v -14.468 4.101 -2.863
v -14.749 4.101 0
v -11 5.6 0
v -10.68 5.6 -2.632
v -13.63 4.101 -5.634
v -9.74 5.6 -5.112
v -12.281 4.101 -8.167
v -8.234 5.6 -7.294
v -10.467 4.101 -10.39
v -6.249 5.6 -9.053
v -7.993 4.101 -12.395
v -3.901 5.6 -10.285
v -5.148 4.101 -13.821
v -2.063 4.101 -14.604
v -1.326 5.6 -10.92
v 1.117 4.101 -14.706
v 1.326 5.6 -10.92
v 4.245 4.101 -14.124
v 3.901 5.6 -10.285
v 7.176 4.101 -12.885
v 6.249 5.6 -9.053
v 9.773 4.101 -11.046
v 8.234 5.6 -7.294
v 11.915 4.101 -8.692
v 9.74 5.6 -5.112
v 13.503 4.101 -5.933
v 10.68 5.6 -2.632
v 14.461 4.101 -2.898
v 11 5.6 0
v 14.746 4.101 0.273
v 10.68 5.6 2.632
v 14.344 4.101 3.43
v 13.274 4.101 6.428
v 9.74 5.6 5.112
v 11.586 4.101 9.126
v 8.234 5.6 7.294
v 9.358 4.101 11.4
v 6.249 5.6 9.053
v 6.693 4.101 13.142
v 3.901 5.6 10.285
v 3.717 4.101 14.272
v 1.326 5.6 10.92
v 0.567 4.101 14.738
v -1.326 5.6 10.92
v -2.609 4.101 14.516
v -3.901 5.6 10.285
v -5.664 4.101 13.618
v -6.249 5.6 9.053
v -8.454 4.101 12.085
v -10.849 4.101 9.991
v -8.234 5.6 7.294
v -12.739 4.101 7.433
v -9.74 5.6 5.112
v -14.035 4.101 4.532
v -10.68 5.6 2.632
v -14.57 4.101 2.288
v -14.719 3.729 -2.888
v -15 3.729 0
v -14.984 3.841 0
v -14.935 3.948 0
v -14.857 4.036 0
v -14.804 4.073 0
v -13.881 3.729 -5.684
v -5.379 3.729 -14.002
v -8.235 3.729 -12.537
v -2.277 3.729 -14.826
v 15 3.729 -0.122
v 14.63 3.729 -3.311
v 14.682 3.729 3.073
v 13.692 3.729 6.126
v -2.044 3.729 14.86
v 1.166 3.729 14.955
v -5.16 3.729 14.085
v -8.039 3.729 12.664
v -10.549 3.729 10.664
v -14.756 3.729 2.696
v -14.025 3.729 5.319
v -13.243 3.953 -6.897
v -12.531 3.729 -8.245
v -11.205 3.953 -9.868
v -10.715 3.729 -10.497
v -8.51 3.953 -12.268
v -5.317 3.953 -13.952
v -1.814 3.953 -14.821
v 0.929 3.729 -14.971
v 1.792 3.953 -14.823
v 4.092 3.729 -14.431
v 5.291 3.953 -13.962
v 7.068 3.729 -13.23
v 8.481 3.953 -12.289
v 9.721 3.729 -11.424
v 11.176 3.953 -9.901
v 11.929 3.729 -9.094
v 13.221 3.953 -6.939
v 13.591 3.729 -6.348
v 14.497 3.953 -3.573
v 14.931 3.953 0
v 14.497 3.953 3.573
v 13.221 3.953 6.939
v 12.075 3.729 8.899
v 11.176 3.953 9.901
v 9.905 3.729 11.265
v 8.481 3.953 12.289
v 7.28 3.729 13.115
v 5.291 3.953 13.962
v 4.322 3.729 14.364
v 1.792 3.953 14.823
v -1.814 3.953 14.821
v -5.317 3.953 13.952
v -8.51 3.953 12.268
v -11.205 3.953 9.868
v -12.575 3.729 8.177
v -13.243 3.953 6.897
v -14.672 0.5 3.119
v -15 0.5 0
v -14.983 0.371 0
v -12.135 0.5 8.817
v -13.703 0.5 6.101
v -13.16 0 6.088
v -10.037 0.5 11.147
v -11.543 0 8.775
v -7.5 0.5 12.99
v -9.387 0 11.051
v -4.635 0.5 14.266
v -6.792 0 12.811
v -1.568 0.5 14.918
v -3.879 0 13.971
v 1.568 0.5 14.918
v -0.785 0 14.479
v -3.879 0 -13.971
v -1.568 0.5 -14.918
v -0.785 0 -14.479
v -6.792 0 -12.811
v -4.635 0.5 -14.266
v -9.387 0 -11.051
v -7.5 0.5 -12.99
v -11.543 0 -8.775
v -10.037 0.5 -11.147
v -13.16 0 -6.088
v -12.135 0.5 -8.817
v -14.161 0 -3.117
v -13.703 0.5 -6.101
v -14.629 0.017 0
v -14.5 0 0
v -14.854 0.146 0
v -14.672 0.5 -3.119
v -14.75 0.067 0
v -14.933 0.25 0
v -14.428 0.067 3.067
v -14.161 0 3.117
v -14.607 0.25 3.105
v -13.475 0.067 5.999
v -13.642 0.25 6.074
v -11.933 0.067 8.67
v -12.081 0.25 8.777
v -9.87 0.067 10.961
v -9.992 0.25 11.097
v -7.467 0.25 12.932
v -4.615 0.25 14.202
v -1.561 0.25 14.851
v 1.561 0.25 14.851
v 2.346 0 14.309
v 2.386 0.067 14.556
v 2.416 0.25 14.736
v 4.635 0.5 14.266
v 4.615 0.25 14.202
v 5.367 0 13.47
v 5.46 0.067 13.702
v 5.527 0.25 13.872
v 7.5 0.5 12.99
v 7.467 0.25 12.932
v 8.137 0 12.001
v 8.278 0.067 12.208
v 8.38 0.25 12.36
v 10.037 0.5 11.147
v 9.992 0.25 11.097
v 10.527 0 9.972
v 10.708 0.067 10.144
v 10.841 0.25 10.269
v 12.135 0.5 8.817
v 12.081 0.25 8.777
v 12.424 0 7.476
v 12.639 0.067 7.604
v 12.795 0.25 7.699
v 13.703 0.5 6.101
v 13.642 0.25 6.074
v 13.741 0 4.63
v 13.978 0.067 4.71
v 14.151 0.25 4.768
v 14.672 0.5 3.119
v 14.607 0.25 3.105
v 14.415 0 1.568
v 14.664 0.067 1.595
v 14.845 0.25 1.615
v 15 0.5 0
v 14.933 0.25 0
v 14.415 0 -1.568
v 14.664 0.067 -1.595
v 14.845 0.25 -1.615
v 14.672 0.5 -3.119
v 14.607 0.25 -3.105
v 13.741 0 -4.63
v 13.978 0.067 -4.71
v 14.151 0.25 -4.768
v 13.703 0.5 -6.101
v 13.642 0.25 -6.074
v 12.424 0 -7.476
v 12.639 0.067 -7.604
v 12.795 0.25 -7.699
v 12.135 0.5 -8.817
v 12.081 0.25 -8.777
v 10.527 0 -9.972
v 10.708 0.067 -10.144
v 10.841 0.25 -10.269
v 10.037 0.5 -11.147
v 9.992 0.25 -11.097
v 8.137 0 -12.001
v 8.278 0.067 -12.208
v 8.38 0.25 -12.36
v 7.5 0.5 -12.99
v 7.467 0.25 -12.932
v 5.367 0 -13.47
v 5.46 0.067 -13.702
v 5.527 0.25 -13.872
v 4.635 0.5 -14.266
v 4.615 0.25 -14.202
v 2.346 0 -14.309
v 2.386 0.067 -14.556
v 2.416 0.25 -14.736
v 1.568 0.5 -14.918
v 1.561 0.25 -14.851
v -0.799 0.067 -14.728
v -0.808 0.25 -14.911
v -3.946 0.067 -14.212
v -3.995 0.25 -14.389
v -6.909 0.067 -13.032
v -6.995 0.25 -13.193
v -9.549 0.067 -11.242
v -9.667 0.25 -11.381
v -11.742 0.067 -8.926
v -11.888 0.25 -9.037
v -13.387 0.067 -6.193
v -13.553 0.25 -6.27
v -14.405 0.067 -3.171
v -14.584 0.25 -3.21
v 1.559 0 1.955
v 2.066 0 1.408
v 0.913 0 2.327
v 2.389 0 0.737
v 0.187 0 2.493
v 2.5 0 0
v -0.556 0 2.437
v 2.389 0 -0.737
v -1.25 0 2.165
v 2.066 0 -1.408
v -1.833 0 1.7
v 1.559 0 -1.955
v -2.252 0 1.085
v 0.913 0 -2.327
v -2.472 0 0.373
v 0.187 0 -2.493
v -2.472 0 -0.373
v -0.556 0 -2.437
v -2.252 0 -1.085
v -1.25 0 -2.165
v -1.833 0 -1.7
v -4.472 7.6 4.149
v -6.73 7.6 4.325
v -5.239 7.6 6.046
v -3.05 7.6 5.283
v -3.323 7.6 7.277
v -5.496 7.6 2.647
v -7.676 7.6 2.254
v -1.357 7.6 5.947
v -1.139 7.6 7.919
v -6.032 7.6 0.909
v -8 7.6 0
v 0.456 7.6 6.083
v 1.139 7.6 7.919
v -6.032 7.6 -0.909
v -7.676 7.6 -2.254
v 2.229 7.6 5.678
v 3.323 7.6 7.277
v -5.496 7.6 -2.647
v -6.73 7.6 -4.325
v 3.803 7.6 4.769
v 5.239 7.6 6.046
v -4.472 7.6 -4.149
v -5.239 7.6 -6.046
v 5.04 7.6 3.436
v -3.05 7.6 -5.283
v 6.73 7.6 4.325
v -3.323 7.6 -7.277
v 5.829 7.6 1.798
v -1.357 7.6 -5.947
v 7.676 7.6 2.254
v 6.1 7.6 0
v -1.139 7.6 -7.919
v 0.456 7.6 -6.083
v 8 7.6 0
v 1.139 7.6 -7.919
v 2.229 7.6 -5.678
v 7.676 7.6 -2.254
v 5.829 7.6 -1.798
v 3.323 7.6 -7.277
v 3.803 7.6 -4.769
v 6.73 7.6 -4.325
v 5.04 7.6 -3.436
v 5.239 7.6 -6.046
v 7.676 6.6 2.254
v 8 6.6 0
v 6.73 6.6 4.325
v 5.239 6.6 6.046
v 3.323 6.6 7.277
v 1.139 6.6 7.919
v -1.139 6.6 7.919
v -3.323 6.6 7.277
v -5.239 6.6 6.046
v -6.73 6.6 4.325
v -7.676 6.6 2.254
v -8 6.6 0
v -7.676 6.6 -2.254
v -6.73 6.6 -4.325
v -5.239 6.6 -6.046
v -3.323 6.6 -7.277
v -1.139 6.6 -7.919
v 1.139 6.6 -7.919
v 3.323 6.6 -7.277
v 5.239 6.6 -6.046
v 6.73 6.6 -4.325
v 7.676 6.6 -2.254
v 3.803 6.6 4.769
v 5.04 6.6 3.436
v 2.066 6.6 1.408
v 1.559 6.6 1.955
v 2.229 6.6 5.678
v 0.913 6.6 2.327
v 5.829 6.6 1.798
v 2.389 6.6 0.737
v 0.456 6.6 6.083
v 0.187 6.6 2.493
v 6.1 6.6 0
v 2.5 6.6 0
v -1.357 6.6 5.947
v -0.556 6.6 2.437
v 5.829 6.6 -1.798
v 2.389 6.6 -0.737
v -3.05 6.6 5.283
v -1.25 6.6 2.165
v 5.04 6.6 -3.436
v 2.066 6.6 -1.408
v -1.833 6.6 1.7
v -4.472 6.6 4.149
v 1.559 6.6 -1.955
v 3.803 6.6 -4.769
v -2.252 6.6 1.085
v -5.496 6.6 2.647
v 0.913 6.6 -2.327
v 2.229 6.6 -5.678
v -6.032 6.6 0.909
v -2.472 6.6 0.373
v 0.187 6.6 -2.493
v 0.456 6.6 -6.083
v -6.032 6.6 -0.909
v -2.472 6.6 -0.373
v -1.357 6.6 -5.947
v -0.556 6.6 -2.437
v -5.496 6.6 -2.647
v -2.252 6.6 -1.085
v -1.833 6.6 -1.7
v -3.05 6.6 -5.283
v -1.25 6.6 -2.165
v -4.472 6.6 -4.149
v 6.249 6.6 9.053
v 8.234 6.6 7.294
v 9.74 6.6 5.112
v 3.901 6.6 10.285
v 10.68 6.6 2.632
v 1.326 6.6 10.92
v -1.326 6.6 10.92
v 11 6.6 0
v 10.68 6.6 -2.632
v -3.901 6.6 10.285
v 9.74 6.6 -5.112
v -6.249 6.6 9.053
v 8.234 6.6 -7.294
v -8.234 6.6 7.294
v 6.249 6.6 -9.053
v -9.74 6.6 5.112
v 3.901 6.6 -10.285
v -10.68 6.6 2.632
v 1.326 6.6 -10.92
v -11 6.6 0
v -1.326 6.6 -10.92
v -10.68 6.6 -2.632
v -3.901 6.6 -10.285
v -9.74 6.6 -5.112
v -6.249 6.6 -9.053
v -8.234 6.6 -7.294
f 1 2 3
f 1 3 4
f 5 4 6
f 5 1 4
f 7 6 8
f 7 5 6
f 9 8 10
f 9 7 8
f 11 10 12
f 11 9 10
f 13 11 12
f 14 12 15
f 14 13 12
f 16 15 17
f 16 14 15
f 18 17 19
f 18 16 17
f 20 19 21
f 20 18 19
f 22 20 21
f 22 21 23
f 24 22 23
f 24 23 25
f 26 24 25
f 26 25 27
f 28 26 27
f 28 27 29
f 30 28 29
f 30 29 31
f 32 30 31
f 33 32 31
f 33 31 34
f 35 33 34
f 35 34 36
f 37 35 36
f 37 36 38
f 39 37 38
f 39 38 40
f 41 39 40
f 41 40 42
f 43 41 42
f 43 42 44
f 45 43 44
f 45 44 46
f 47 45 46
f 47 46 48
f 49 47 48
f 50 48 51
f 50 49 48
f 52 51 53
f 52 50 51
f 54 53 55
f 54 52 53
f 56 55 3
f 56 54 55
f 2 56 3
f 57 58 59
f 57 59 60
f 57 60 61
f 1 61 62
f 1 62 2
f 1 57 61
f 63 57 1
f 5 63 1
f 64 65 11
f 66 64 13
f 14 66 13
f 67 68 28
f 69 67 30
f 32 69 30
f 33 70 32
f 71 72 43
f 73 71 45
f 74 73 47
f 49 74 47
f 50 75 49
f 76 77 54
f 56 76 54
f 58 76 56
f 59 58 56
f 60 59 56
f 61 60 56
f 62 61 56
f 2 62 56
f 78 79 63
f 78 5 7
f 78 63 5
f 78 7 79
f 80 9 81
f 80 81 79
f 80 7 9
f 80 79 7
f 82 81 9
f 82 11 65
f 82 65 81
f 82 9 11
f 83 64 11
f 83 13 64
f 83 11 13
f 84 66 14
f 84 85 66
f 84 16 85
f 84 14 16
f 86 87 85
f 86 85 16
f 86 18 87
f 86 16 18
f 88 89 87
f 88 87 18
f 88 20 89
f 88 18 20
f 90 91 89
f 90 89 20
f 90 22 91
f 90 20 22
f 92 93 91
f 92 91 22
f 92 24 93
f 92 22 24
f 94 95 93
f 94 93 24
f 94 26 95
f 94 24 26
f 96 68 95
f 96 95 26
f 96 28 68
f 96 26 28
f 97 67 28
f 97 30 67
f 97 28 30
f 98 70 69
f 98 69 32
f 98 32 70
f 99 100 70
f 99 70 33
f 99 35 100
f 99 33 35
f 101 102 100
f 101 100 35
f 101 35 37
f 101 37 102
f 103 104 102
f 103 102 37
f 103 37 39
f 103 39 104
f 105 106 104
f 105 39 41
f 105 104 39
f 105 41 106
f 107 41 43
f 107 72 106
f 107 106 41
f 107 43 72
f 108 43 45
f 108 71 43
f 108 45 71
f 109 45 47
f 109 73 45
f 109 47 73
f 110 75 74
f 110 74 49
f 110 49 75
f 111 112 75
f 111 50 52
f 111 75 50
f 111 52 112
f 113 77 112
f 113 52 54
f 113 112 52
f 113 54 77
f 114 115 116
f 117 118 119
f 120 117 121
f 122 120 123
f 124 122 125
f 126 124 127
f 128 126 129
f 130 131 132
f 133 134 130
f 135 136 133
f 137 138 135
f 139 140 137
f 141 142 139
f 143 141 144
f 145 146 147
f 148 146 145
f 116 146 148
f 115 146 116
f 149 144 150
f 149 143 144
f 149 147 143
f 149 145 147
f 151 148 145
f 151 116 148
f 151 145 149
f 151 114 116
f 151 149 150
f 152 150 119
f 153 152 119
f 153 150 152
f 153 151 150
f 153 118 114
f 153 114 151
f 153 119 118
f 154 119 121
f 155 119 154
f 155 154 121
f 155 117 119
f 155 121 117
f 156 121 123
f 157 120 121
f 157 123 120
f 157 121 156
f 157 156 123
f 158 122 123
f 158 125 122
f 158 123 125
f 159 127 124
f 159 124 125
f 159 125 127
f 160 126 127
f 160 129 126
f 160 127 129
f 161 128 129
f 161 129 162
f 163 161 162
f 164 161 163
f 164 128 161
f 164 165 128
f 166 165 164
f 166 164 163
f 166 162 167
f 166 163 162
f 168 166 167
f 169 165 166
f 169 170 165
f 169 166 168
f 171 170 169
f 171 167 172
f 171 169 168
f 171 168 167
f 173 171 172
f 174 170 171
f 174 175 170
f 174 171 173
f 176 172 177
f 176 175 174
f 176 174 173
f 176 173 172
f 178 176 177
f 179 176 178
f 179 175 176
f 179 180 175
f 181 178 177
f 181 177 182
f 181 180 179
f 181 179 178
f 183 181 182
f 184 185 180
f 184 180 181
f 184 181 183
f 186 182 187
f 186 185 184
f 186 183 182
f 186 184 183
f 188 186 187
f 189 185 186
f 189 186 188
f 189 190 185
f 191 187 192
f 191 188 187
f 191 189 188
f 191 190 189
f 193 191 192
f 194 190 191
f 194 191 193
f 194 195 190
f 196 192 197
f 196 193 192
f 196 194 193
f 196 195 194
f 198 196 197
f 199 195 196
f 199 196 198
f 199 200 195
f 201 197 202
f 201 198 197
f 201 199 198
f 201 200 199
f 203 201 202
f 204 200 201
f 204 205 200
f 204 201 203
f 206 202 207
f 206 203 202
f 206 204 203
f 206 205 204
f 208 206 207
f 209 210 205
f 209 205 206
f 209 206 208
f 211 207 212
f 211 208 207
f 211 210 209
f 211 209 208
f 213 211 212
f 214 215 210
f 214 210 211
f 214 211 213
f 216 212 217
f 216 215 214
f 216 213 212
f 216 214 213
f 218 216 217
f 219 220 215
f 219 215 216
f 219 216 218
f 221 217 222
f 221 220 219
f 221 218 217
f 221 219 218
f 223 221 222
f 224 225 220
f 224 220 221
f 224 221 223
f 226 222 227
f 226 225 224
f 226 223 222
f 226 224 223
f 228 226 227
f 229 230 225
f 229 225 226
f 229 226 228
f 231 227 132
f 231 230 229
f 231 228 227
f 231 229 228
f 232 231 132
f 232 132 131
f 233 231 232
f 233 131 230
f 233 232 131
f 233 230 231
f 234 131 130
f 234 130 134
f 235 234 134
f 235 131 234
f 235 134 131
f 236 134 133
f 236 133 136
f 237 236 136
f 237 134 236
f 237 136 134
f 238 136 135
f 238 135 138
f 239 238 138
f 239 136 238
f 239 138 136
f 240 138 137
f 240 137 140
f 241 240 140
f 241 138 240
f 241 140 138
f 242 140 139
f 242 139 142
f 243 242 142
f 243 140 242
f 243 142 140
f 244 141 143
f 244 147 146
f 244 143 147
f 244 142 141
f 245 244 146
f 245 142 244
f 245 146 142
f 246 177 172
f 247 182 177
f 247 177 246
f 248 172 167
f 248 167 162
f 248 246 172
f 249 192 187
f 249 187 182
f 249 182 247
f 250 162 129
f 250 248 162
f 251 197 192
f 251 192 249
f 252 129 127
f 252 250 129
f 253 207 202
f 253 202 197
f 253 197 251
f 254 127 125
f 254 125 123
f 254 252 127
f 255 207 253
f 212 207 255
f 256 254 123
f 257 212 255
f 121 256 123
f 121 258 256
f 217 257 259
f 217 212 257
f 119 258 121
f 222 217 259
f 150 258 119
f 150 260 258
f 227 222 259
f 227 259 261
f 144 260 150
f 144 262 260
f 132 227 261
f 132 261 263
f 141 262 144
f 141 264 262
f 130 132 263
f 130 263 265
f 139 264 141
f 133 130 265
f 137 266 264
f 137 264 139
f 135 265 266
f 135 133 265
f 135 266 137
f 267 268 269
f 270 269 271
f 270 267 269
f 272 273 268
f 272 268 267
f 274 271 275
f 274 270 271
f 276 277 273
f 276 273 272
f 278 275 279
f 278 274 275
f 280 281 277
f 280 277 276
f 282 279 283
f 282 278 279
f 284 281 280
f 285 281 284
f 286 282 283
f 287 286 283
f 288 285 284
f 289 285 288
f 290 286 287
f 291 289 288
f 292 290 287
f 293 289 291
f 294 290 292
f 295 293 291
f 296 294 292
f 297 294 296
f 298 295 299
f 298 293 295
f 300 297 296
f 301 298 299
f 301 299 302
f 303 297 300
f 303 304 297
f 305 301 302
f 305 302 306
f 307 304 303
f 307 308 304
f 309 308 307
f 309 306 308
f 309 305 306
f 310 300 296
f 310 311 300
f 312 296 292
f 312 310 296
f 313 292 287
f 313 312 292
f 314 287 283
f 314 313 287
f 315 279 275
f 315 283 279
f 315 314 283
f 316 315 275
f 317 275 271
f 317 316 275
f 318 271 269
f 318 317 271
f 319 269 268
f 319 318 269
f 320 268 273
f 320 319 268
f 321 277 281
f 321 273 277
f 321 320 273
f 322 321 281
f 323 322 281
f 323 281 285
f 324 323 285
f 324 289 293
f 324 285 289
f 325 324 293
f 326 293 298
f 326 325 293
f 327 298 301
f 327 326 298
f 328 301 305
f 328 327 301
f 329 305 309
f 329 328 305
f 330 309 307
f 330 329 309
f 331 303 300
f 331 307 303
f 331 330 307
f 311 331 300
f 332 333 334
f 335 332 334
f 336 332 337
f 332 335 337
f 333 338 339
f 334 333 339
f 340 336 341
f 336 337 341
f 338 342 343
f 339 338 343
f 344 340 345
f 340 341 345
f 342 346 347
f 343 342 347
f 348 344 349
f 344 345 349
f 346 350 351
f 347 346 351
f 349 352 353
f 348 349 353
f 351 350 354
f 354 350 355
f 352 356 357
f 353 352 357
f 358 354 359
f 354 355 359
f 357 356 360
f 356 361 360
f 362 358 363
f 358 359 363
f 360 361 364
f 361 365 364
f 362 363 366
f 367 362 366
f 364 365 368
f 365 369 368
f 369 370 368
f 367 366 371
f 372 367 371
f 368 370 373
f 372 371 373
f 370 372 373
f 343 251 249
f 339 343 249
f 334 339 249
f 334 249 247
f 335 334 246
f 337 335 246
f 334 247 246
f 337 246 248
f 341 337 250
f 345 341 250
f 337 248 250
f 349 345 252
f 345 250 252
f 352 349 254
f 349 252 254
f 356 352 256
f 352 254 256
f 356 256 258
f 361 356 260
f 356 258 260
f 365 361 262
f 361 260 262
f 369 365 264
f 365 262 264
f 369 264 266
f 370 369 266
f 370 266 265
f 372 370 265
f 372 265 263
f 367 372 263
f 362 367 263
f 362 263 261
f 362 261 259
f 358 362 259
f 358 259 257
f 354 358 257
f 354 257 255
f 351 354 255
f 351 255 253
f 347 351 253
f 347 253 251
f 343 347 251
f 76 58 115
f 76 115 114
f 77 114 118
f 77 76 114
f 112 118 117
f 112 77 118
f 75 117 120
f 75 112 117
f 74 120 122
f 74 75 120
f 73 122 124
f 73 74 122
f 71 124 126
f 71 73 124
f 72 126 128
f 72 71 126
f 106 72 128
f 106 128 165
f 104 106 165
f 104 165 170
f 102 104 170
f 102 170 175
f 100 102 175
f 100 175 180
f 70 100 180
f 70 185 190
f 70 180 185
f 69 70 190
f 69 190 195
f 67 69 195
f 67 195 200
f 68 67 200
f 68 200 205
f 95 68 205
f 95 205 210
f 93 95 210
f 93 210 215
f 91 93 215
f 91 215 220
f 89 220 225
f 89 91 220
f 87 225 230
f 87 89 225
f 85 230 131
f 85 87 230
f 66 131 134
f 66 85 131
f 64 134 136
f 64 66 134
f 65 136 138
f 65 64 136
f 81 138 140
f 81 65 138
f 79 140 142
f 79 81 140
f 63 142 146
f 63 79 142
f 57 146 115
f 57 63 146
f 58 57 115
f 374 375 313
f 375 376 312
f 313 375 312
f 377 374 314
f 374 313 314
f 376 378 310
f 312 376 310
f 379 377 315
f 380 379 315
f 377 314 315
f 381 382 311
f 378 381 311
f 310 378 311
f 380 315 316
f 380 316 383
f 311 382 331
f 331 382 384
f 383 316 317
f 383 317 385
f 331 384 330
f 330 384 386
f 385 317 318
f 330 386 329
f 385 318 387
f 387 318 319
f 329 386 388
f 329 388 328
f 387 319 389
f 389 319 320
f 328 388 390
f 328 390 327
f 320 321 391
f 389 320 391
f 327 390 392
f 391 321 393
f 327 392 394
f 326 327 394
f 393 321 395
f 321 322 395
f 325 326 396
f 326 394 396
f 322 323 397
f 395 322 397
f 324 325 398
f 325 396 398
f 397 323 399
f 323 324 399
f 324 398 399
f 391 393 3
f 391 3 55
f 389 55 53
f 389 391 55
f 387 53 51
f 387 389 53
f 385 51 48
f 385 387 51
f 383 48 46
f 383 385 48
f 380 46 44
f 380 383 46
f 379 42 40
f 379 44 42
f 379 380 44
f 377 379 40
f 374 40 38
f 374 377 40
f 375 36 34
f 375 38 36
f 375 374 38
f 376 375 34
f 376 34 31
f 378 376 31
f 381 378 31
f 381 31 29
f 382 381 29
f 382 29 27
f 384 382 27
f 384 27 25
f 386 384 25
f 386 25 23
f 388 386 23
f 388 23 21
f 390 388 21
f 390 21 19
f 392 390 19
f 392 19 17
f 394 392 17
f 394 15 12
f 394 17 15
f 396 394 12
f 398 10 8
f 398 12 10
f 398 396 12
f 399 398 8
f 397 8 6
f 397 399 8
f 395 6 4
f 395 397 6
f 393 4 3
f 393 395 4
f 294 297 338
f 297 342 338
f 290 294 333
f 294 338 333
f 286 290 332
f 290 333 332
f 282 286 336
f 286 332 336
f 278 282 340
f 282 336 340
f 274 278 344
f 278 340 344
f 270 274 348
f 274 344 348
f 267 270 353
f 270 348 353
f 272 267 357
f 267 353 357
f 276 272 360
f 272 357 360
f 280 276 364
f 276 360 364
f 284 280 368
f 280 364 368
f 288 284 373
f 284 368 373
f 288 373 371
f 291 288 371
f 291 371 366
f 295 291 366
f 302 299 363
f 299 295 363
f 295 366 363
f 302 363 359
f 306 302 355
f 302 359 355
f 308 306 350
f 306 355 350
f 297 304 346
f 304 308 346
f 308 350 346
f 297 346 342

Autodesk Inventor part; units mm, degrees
ref_plane "YZ Plane" through (0, 0, 0) normal (1, 0, 0) x (0, 1, 0)
ref_plane "XZ Plane" through (0, 0, 0) normal (0, 1, 0) x (-1, 0, 0)
ref_plane "XY Plane" through (0, 0, 0) normal (0, 0, 1) x (1, 0, 0)
sketch "Sketch1" plane through (0, 0, 0) normal (0, 0, 1) x (1, 0, 0)
  line L0 (0, 0) -> (-15, 0)
  line L1 (-15, 0) -> (-15, 4)
  line L2 (-15, 4) -> (-11, 5.6)
  line L3 (-11, 5.6) -> (-11, 6.6)
  line L4 (-11, 6.6) -> (0, 6.6)
  line L5 (0, 6.6) -> (0, 0)
  dimension "d1" = 4
  dimension "d5" = 1
  dimension "d12" = 11
  dimension "d13" = 2.6
  dimension "d14" = 4
revolve "Revolution1" add sketch "Sketch1" angle 360 about axis through (0, 6.6, 0) along (0, -1, 0)
fillet "Fillet1" radius 0.5 1 edges at (15, 0, 0)
sketch "Sketch3" plane through (0, 0, 0) normal (0, -1, 0) x (1, 0, 0)
  circle A0 centre (0, 0) radius 2.5
  dimension "d15" = 5
extrude "Extrusion2" cut sketch "Sketch3" against normal up to surface (6.6 mm away)
fillet "Fillet2" radius 0.4 1 edges at (15, 4, 0)
sketch "Sketch4" plane through (0, 6.6, 0) normal (0, 1, 0) x (1, 0, 0)
  circle A0 centre (0, 0) radius 8
  circle A1 centre (0, 0) radius 6.1
  dimension "d19" = 16
  dimension "d20" = 1.9
extrude "Extrusion3" add sketch "Sketch4" along normal blind 1
properties part number "pulley"
